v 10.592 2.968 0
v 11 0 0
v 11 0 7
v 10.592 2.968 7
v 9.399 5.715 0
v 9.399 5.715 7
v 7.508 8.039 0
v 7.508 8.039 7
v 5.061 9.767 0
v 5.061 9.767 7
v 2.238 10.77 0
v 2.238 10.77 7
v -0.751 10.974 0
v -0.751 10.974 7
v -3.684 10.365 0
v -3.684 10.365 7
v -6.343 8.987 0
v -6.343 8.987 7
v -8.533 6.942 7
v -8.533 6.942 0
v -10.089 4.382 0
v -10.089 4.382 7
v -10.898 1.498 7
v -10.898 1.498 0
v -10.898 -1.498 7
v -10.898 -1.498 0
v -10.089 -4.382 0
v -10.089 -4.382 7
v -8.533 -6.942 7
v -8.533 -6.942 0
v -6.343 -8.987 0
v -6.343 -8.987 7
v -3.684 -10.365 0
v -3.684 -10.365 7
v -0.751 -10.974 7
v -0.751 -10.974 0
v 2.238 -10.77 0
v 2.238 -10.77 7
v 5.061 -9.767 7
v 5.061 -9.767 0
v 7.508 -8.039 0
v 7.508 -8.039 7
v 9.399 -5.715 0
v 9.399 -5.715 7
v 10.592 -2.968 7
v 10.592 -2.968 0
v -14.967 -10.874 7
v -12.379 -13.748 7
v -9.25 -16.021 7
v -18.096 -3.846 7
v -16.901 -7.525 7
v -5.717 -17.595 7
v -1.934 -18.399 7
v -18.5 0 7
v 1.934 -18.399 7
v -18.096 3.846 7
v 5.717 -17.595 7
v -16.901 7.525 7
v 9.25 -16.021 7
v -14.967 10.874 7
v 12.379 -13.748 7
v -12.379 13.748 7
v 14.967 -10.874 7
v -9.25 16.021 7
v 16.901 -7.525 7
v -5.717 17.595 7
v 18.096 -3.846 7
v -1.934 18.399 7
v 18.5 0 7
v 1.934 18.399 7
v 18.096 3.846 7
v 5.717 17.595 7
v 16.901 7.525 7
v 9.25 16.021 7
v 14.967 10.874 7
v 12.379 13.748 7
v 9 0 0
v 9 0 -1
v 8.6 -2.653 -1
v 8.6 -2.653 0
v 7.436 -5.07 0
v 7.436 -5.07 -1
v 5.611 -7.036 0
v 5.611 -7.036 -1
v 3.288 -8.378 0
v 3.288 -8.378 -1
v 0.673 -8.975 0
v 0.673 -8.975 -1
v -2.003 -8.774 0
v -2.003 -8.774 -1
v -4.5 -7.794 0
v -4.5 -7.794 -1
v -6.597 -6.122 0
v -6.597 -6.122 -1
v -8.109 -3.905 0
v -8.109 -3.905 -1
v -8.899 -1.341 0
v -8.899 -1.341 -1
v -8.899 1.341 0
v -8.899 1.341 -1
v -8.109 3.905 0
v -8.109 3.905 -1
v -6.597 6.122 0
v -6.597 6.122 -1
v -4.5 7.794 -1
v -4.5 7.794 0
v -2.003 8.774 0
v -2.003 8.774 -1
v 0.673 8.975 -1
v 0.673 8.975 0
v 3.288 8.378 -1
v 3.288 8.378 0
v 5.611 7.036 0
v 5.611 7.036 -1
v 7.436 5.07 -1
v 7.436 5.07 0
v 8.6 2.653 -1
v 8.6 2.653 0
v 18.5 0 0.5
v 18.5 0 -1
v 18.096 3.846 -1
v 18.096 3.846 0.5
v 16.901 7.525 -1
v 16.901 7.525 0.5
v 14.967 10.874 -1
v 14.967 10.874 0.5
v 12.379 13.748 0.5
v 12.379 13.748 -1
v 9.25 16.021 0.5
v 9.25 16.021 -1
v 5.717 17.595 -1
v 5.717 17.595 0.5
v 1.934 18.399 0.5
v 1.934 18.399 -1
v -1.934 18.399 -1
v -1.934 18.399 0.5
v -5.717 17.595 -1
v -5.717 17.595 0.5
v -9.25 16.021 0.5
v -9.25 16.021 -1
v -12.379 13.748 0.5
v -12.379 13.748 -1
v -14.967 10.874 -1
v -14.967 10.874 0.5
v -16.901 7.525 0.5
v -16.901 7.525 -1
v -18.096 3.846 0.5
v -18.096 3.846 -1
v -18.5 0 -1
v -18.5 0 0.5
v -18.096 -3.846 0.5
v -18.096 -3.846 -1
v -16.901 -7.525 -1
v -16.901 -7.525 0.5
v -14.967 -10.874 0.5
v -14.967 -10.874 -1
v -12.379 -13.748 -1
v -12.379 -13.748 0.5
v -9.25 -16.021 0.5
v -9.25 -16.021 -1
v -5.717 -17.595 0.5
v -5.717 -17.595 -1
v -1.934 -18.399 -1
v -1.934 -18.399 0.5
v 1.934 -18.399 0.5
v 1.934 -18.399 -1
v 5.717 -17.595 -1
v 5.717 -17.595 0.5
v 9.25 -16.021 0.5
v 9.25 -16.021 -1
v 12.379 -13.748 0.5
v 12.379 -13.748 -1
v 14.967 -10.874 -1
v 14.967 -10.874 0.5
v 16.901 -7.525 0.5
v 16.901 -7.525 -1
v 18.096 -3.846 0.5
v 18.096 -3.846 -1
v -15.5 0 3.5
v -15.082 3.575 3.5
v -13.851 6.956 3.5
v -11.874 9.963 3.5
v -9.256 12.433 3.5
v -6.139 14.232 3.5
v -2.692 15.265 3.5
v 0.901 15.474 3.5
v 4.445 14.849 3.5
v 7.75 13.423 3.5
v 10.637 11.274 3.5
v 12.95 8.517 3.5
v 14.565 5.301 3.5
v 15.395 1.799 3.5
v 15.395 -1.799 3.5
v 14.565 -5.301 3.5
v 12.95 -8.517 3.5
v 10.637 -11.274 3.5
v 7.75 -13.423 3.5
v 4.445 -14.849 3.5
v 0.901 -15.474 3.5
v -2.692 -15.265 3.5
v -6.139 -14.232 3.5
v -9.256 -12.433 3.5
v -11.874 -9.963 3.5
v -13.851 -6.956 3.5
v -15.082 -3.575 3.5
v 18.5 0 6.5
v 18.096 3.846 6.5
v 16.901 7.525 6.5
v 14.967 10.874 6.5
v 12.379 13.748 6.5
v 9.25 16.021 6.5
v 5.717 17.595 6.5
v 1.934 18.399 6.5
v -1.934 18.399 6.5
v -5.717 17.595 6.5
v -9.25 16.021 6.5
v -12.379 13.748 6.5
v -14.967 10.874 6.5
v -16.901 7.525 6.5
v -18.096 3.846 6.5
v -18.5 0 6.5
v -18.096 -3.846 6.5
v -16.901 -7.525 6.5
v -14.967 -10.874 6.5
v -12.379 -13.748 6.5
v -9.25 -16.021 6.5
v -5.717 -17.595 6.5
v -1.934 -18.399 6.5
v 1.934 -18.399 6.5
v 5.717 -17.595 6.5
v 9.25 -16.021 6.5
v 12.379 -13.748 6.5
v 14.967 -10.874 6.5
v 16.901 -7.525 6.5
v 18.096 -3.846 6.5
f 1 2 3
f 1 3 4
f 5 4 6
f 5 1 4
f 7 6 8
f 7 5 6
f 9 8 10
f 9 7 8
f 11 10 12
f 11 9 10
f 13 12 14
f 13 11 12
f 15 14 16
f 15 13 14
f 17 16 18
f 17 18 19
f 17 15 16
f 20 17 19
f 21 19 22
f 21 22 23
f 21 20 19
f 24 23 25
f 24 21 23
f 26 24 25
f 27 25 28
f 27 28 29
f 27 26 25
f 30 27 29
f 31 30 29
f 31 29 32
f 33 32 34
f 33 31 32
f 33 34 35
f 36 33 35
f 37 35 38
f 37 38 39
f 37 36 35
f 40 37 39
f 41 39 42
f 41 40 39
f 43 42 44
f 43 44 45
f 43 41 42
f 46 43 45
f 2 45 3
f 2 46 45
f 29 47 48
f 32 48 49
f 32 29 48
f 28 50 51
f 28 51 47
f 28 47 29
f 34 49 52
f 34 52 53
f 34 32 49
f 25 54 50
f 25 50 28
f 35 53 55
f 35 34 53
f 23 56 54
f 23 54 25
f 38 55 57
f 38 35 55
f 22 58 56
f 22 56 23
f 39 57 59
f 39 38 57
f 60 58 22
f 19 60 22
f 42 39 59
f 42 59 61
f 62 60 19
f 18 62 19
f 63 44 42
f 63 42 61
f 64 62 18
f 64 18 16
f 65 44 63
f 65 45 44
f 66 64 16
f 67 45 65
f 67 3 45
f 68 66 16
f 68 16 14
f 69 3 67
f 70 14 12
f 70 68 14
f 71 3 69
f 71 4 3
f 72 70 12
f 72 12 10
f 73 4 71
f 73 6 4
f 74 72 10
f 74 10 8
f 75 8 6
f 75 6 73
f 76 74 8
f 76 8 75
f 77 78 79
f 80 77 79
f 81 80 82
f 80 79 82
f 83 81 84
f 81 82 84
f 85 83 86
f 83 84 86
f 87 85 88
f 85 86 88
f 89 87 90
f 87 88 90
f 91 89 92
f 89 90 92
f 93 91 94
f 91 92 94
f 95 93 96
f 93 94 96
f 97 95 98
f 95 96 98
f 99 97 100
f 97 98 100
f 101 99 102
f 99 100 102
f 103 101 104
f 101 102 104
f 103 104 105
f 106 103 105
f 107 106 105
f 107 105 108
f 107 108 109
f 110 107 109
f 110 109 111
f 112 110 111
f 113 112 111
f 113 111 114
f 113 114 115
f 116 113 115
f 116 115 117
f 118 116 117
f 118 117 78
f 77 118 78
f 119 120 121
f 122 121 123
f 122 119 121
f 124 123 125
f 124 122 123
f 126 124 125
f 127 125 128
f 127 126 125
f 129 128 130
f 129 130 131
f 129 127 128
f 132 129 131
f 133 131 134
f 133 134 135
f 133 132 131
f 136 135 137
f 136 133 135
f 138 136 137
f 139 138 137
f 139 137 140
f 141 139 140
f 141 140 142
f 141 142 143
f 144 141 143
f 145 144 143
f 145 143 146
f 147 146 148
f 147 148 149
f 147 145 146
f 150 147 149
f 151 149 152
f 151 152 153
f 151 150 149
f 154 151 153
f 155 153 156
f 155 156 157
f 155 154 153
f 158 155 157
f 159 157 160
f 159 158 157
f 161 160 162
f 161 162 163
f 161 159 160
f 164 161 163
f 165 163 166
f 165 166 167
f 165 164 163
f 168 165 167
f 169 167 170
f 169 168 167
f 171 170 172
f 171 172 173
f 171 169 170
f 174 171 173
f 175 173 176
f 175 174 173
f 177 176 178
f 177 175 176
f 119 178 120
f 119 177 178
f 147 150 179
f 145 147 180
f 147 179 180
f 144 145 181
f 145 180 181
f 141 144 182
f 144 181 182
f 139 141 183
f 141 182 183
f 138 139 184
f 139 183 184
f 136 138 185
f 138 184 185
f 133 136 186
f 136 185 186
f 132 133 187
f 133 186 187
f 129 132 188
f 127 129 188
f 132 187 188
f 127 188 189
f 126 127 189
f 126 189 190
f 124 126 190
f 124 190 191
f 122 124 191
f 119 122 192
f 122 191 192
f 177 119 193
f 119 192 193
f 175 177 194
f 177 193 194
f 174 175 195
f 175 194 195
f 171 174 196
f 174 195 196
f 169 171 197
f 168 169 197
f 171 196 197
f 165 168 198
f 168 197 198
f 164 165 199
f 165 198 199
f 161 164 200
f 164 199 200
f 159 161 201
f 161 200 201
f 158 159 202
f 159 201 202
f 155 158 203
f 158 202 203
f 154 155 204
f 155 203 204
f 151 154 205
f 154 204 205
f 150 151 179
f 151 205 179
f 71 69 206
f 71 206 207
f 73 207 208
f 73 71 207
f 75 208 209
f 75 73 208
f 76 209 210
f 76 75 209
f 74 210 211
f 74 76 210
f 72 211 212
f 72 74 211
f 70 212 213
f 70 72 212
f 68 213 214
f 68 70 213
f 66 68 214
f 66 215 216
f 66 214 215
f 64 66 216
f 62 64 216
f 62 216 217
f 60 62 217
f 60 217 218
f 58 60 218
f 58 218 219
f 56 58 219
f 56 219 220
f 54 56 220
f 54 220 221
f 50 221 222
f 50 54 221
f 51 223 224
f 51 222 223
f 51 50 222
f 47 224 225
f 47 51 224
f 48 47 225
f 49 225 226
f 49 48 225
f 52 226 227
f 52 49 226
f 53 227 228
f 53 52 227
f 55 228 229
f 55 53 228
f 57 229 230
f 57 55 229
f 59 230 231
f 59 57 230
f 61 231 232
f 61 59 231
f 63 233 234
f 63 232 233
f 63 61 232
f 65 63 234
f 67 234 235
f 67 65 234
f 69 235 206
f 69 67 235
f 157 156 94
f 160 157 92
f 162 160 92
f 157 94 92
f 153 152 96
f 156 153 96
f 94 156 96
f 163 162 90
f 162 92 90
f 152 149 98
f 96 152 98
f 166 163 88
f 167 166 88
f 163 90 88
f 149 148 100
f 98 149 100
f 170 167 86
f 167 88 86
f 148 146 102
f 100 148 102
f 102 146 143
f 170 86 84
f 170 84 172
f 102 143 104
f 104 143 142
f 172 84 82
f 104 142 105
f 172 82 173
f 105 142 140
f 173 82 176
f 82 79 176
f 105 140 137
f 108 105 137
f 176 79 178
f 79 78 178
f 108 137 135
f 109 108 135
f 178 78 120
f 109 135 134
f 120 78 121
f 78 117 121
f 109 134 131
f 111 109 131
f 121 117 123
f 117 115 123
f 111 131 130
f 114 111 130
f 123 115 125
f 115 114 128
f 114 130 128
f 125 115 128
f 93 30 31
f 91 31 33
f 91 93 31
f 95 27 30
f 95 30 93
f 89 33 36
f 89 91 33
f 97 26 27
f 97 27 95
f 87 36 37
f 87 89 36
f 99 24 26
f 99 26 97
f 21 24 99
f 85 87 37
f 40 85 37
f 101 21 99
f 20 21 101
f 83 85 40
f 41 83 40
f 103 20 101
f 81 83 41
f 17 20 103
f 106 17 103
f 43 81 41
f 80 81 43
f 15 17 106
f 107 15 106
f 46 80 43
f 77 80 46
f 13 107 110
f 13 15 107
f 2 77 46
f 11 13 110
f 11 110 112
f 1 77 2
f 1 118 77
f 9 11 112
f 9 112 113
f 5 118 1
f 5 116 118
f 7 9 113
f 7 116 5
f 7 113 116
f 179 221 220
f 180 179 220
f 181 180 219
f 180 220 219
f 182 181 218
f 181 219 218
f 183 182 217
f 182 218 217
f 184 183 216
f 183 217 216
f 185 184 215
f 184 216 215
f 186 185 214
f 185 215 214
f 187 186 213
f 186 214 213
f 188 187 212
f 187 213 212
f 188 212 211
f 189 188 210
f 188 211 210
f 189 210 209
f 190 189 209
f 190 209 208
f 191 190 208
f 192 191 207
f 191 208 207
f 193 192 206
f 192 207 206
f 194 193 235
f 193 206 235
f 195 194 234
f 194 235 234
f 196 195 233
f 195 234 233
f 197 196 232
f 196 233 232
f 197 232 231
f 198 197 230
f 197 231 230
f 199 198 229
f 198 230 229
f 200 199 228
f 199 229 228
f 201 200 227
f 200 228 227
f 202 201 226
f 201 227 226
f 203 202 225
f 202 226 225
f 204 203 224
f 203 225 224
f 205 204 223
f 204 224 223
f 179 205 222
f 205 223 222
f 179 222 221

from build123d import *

# Parameters (mm, degrees)
F0_R     = 18.5
F0_R_2   = 11
F1_DEPTH = 7
F2_DEPTH = 1
F3_R     = 9
F4_DEPTH = 25


with BuildPart() as f1:
    # F0 (on Top) → F1 (new body)
    with BuildSketch(Plane.XY):
        Circle(F0_R)
        Circle(F0_R_2, mode=Mode.SUBTRACT)
    extrude(amount=F1_DEPTH)

    # F0 (on Top) → F2 (join)
    with BuildSketch(Plane.XY):
        Circle(F0_R)
        Circle(F0_R_2, mode=Mode.SUBTRACT)
        Circle(F0_R_2)
    extrude(amount=-F2_DEPTH)

    # F3 (on face) → F4 (cut)
    with BuildSketch(Plane(origin=(0, 0, -1), x_dir=(1, 0, 0), z_dir=(0, 0, -1))):
        Circle(F3_R)
    extrude(amount=-F4_DEPTH, mode=Mode.SUBTRACT)

    # F5 (on Front) → F6 (revolve, cut)
    with BuildSketch(Plane.XZ):
        Polygon((-18.5, 6.5), (-18.5, 0.5), (-15.5, 3.5), align=None)
    revolve(axis=Axis((0, 0, 3.0658829492), (0, 0, -1)), mode=Mode.SUBTRACT)


solid = f1.part
